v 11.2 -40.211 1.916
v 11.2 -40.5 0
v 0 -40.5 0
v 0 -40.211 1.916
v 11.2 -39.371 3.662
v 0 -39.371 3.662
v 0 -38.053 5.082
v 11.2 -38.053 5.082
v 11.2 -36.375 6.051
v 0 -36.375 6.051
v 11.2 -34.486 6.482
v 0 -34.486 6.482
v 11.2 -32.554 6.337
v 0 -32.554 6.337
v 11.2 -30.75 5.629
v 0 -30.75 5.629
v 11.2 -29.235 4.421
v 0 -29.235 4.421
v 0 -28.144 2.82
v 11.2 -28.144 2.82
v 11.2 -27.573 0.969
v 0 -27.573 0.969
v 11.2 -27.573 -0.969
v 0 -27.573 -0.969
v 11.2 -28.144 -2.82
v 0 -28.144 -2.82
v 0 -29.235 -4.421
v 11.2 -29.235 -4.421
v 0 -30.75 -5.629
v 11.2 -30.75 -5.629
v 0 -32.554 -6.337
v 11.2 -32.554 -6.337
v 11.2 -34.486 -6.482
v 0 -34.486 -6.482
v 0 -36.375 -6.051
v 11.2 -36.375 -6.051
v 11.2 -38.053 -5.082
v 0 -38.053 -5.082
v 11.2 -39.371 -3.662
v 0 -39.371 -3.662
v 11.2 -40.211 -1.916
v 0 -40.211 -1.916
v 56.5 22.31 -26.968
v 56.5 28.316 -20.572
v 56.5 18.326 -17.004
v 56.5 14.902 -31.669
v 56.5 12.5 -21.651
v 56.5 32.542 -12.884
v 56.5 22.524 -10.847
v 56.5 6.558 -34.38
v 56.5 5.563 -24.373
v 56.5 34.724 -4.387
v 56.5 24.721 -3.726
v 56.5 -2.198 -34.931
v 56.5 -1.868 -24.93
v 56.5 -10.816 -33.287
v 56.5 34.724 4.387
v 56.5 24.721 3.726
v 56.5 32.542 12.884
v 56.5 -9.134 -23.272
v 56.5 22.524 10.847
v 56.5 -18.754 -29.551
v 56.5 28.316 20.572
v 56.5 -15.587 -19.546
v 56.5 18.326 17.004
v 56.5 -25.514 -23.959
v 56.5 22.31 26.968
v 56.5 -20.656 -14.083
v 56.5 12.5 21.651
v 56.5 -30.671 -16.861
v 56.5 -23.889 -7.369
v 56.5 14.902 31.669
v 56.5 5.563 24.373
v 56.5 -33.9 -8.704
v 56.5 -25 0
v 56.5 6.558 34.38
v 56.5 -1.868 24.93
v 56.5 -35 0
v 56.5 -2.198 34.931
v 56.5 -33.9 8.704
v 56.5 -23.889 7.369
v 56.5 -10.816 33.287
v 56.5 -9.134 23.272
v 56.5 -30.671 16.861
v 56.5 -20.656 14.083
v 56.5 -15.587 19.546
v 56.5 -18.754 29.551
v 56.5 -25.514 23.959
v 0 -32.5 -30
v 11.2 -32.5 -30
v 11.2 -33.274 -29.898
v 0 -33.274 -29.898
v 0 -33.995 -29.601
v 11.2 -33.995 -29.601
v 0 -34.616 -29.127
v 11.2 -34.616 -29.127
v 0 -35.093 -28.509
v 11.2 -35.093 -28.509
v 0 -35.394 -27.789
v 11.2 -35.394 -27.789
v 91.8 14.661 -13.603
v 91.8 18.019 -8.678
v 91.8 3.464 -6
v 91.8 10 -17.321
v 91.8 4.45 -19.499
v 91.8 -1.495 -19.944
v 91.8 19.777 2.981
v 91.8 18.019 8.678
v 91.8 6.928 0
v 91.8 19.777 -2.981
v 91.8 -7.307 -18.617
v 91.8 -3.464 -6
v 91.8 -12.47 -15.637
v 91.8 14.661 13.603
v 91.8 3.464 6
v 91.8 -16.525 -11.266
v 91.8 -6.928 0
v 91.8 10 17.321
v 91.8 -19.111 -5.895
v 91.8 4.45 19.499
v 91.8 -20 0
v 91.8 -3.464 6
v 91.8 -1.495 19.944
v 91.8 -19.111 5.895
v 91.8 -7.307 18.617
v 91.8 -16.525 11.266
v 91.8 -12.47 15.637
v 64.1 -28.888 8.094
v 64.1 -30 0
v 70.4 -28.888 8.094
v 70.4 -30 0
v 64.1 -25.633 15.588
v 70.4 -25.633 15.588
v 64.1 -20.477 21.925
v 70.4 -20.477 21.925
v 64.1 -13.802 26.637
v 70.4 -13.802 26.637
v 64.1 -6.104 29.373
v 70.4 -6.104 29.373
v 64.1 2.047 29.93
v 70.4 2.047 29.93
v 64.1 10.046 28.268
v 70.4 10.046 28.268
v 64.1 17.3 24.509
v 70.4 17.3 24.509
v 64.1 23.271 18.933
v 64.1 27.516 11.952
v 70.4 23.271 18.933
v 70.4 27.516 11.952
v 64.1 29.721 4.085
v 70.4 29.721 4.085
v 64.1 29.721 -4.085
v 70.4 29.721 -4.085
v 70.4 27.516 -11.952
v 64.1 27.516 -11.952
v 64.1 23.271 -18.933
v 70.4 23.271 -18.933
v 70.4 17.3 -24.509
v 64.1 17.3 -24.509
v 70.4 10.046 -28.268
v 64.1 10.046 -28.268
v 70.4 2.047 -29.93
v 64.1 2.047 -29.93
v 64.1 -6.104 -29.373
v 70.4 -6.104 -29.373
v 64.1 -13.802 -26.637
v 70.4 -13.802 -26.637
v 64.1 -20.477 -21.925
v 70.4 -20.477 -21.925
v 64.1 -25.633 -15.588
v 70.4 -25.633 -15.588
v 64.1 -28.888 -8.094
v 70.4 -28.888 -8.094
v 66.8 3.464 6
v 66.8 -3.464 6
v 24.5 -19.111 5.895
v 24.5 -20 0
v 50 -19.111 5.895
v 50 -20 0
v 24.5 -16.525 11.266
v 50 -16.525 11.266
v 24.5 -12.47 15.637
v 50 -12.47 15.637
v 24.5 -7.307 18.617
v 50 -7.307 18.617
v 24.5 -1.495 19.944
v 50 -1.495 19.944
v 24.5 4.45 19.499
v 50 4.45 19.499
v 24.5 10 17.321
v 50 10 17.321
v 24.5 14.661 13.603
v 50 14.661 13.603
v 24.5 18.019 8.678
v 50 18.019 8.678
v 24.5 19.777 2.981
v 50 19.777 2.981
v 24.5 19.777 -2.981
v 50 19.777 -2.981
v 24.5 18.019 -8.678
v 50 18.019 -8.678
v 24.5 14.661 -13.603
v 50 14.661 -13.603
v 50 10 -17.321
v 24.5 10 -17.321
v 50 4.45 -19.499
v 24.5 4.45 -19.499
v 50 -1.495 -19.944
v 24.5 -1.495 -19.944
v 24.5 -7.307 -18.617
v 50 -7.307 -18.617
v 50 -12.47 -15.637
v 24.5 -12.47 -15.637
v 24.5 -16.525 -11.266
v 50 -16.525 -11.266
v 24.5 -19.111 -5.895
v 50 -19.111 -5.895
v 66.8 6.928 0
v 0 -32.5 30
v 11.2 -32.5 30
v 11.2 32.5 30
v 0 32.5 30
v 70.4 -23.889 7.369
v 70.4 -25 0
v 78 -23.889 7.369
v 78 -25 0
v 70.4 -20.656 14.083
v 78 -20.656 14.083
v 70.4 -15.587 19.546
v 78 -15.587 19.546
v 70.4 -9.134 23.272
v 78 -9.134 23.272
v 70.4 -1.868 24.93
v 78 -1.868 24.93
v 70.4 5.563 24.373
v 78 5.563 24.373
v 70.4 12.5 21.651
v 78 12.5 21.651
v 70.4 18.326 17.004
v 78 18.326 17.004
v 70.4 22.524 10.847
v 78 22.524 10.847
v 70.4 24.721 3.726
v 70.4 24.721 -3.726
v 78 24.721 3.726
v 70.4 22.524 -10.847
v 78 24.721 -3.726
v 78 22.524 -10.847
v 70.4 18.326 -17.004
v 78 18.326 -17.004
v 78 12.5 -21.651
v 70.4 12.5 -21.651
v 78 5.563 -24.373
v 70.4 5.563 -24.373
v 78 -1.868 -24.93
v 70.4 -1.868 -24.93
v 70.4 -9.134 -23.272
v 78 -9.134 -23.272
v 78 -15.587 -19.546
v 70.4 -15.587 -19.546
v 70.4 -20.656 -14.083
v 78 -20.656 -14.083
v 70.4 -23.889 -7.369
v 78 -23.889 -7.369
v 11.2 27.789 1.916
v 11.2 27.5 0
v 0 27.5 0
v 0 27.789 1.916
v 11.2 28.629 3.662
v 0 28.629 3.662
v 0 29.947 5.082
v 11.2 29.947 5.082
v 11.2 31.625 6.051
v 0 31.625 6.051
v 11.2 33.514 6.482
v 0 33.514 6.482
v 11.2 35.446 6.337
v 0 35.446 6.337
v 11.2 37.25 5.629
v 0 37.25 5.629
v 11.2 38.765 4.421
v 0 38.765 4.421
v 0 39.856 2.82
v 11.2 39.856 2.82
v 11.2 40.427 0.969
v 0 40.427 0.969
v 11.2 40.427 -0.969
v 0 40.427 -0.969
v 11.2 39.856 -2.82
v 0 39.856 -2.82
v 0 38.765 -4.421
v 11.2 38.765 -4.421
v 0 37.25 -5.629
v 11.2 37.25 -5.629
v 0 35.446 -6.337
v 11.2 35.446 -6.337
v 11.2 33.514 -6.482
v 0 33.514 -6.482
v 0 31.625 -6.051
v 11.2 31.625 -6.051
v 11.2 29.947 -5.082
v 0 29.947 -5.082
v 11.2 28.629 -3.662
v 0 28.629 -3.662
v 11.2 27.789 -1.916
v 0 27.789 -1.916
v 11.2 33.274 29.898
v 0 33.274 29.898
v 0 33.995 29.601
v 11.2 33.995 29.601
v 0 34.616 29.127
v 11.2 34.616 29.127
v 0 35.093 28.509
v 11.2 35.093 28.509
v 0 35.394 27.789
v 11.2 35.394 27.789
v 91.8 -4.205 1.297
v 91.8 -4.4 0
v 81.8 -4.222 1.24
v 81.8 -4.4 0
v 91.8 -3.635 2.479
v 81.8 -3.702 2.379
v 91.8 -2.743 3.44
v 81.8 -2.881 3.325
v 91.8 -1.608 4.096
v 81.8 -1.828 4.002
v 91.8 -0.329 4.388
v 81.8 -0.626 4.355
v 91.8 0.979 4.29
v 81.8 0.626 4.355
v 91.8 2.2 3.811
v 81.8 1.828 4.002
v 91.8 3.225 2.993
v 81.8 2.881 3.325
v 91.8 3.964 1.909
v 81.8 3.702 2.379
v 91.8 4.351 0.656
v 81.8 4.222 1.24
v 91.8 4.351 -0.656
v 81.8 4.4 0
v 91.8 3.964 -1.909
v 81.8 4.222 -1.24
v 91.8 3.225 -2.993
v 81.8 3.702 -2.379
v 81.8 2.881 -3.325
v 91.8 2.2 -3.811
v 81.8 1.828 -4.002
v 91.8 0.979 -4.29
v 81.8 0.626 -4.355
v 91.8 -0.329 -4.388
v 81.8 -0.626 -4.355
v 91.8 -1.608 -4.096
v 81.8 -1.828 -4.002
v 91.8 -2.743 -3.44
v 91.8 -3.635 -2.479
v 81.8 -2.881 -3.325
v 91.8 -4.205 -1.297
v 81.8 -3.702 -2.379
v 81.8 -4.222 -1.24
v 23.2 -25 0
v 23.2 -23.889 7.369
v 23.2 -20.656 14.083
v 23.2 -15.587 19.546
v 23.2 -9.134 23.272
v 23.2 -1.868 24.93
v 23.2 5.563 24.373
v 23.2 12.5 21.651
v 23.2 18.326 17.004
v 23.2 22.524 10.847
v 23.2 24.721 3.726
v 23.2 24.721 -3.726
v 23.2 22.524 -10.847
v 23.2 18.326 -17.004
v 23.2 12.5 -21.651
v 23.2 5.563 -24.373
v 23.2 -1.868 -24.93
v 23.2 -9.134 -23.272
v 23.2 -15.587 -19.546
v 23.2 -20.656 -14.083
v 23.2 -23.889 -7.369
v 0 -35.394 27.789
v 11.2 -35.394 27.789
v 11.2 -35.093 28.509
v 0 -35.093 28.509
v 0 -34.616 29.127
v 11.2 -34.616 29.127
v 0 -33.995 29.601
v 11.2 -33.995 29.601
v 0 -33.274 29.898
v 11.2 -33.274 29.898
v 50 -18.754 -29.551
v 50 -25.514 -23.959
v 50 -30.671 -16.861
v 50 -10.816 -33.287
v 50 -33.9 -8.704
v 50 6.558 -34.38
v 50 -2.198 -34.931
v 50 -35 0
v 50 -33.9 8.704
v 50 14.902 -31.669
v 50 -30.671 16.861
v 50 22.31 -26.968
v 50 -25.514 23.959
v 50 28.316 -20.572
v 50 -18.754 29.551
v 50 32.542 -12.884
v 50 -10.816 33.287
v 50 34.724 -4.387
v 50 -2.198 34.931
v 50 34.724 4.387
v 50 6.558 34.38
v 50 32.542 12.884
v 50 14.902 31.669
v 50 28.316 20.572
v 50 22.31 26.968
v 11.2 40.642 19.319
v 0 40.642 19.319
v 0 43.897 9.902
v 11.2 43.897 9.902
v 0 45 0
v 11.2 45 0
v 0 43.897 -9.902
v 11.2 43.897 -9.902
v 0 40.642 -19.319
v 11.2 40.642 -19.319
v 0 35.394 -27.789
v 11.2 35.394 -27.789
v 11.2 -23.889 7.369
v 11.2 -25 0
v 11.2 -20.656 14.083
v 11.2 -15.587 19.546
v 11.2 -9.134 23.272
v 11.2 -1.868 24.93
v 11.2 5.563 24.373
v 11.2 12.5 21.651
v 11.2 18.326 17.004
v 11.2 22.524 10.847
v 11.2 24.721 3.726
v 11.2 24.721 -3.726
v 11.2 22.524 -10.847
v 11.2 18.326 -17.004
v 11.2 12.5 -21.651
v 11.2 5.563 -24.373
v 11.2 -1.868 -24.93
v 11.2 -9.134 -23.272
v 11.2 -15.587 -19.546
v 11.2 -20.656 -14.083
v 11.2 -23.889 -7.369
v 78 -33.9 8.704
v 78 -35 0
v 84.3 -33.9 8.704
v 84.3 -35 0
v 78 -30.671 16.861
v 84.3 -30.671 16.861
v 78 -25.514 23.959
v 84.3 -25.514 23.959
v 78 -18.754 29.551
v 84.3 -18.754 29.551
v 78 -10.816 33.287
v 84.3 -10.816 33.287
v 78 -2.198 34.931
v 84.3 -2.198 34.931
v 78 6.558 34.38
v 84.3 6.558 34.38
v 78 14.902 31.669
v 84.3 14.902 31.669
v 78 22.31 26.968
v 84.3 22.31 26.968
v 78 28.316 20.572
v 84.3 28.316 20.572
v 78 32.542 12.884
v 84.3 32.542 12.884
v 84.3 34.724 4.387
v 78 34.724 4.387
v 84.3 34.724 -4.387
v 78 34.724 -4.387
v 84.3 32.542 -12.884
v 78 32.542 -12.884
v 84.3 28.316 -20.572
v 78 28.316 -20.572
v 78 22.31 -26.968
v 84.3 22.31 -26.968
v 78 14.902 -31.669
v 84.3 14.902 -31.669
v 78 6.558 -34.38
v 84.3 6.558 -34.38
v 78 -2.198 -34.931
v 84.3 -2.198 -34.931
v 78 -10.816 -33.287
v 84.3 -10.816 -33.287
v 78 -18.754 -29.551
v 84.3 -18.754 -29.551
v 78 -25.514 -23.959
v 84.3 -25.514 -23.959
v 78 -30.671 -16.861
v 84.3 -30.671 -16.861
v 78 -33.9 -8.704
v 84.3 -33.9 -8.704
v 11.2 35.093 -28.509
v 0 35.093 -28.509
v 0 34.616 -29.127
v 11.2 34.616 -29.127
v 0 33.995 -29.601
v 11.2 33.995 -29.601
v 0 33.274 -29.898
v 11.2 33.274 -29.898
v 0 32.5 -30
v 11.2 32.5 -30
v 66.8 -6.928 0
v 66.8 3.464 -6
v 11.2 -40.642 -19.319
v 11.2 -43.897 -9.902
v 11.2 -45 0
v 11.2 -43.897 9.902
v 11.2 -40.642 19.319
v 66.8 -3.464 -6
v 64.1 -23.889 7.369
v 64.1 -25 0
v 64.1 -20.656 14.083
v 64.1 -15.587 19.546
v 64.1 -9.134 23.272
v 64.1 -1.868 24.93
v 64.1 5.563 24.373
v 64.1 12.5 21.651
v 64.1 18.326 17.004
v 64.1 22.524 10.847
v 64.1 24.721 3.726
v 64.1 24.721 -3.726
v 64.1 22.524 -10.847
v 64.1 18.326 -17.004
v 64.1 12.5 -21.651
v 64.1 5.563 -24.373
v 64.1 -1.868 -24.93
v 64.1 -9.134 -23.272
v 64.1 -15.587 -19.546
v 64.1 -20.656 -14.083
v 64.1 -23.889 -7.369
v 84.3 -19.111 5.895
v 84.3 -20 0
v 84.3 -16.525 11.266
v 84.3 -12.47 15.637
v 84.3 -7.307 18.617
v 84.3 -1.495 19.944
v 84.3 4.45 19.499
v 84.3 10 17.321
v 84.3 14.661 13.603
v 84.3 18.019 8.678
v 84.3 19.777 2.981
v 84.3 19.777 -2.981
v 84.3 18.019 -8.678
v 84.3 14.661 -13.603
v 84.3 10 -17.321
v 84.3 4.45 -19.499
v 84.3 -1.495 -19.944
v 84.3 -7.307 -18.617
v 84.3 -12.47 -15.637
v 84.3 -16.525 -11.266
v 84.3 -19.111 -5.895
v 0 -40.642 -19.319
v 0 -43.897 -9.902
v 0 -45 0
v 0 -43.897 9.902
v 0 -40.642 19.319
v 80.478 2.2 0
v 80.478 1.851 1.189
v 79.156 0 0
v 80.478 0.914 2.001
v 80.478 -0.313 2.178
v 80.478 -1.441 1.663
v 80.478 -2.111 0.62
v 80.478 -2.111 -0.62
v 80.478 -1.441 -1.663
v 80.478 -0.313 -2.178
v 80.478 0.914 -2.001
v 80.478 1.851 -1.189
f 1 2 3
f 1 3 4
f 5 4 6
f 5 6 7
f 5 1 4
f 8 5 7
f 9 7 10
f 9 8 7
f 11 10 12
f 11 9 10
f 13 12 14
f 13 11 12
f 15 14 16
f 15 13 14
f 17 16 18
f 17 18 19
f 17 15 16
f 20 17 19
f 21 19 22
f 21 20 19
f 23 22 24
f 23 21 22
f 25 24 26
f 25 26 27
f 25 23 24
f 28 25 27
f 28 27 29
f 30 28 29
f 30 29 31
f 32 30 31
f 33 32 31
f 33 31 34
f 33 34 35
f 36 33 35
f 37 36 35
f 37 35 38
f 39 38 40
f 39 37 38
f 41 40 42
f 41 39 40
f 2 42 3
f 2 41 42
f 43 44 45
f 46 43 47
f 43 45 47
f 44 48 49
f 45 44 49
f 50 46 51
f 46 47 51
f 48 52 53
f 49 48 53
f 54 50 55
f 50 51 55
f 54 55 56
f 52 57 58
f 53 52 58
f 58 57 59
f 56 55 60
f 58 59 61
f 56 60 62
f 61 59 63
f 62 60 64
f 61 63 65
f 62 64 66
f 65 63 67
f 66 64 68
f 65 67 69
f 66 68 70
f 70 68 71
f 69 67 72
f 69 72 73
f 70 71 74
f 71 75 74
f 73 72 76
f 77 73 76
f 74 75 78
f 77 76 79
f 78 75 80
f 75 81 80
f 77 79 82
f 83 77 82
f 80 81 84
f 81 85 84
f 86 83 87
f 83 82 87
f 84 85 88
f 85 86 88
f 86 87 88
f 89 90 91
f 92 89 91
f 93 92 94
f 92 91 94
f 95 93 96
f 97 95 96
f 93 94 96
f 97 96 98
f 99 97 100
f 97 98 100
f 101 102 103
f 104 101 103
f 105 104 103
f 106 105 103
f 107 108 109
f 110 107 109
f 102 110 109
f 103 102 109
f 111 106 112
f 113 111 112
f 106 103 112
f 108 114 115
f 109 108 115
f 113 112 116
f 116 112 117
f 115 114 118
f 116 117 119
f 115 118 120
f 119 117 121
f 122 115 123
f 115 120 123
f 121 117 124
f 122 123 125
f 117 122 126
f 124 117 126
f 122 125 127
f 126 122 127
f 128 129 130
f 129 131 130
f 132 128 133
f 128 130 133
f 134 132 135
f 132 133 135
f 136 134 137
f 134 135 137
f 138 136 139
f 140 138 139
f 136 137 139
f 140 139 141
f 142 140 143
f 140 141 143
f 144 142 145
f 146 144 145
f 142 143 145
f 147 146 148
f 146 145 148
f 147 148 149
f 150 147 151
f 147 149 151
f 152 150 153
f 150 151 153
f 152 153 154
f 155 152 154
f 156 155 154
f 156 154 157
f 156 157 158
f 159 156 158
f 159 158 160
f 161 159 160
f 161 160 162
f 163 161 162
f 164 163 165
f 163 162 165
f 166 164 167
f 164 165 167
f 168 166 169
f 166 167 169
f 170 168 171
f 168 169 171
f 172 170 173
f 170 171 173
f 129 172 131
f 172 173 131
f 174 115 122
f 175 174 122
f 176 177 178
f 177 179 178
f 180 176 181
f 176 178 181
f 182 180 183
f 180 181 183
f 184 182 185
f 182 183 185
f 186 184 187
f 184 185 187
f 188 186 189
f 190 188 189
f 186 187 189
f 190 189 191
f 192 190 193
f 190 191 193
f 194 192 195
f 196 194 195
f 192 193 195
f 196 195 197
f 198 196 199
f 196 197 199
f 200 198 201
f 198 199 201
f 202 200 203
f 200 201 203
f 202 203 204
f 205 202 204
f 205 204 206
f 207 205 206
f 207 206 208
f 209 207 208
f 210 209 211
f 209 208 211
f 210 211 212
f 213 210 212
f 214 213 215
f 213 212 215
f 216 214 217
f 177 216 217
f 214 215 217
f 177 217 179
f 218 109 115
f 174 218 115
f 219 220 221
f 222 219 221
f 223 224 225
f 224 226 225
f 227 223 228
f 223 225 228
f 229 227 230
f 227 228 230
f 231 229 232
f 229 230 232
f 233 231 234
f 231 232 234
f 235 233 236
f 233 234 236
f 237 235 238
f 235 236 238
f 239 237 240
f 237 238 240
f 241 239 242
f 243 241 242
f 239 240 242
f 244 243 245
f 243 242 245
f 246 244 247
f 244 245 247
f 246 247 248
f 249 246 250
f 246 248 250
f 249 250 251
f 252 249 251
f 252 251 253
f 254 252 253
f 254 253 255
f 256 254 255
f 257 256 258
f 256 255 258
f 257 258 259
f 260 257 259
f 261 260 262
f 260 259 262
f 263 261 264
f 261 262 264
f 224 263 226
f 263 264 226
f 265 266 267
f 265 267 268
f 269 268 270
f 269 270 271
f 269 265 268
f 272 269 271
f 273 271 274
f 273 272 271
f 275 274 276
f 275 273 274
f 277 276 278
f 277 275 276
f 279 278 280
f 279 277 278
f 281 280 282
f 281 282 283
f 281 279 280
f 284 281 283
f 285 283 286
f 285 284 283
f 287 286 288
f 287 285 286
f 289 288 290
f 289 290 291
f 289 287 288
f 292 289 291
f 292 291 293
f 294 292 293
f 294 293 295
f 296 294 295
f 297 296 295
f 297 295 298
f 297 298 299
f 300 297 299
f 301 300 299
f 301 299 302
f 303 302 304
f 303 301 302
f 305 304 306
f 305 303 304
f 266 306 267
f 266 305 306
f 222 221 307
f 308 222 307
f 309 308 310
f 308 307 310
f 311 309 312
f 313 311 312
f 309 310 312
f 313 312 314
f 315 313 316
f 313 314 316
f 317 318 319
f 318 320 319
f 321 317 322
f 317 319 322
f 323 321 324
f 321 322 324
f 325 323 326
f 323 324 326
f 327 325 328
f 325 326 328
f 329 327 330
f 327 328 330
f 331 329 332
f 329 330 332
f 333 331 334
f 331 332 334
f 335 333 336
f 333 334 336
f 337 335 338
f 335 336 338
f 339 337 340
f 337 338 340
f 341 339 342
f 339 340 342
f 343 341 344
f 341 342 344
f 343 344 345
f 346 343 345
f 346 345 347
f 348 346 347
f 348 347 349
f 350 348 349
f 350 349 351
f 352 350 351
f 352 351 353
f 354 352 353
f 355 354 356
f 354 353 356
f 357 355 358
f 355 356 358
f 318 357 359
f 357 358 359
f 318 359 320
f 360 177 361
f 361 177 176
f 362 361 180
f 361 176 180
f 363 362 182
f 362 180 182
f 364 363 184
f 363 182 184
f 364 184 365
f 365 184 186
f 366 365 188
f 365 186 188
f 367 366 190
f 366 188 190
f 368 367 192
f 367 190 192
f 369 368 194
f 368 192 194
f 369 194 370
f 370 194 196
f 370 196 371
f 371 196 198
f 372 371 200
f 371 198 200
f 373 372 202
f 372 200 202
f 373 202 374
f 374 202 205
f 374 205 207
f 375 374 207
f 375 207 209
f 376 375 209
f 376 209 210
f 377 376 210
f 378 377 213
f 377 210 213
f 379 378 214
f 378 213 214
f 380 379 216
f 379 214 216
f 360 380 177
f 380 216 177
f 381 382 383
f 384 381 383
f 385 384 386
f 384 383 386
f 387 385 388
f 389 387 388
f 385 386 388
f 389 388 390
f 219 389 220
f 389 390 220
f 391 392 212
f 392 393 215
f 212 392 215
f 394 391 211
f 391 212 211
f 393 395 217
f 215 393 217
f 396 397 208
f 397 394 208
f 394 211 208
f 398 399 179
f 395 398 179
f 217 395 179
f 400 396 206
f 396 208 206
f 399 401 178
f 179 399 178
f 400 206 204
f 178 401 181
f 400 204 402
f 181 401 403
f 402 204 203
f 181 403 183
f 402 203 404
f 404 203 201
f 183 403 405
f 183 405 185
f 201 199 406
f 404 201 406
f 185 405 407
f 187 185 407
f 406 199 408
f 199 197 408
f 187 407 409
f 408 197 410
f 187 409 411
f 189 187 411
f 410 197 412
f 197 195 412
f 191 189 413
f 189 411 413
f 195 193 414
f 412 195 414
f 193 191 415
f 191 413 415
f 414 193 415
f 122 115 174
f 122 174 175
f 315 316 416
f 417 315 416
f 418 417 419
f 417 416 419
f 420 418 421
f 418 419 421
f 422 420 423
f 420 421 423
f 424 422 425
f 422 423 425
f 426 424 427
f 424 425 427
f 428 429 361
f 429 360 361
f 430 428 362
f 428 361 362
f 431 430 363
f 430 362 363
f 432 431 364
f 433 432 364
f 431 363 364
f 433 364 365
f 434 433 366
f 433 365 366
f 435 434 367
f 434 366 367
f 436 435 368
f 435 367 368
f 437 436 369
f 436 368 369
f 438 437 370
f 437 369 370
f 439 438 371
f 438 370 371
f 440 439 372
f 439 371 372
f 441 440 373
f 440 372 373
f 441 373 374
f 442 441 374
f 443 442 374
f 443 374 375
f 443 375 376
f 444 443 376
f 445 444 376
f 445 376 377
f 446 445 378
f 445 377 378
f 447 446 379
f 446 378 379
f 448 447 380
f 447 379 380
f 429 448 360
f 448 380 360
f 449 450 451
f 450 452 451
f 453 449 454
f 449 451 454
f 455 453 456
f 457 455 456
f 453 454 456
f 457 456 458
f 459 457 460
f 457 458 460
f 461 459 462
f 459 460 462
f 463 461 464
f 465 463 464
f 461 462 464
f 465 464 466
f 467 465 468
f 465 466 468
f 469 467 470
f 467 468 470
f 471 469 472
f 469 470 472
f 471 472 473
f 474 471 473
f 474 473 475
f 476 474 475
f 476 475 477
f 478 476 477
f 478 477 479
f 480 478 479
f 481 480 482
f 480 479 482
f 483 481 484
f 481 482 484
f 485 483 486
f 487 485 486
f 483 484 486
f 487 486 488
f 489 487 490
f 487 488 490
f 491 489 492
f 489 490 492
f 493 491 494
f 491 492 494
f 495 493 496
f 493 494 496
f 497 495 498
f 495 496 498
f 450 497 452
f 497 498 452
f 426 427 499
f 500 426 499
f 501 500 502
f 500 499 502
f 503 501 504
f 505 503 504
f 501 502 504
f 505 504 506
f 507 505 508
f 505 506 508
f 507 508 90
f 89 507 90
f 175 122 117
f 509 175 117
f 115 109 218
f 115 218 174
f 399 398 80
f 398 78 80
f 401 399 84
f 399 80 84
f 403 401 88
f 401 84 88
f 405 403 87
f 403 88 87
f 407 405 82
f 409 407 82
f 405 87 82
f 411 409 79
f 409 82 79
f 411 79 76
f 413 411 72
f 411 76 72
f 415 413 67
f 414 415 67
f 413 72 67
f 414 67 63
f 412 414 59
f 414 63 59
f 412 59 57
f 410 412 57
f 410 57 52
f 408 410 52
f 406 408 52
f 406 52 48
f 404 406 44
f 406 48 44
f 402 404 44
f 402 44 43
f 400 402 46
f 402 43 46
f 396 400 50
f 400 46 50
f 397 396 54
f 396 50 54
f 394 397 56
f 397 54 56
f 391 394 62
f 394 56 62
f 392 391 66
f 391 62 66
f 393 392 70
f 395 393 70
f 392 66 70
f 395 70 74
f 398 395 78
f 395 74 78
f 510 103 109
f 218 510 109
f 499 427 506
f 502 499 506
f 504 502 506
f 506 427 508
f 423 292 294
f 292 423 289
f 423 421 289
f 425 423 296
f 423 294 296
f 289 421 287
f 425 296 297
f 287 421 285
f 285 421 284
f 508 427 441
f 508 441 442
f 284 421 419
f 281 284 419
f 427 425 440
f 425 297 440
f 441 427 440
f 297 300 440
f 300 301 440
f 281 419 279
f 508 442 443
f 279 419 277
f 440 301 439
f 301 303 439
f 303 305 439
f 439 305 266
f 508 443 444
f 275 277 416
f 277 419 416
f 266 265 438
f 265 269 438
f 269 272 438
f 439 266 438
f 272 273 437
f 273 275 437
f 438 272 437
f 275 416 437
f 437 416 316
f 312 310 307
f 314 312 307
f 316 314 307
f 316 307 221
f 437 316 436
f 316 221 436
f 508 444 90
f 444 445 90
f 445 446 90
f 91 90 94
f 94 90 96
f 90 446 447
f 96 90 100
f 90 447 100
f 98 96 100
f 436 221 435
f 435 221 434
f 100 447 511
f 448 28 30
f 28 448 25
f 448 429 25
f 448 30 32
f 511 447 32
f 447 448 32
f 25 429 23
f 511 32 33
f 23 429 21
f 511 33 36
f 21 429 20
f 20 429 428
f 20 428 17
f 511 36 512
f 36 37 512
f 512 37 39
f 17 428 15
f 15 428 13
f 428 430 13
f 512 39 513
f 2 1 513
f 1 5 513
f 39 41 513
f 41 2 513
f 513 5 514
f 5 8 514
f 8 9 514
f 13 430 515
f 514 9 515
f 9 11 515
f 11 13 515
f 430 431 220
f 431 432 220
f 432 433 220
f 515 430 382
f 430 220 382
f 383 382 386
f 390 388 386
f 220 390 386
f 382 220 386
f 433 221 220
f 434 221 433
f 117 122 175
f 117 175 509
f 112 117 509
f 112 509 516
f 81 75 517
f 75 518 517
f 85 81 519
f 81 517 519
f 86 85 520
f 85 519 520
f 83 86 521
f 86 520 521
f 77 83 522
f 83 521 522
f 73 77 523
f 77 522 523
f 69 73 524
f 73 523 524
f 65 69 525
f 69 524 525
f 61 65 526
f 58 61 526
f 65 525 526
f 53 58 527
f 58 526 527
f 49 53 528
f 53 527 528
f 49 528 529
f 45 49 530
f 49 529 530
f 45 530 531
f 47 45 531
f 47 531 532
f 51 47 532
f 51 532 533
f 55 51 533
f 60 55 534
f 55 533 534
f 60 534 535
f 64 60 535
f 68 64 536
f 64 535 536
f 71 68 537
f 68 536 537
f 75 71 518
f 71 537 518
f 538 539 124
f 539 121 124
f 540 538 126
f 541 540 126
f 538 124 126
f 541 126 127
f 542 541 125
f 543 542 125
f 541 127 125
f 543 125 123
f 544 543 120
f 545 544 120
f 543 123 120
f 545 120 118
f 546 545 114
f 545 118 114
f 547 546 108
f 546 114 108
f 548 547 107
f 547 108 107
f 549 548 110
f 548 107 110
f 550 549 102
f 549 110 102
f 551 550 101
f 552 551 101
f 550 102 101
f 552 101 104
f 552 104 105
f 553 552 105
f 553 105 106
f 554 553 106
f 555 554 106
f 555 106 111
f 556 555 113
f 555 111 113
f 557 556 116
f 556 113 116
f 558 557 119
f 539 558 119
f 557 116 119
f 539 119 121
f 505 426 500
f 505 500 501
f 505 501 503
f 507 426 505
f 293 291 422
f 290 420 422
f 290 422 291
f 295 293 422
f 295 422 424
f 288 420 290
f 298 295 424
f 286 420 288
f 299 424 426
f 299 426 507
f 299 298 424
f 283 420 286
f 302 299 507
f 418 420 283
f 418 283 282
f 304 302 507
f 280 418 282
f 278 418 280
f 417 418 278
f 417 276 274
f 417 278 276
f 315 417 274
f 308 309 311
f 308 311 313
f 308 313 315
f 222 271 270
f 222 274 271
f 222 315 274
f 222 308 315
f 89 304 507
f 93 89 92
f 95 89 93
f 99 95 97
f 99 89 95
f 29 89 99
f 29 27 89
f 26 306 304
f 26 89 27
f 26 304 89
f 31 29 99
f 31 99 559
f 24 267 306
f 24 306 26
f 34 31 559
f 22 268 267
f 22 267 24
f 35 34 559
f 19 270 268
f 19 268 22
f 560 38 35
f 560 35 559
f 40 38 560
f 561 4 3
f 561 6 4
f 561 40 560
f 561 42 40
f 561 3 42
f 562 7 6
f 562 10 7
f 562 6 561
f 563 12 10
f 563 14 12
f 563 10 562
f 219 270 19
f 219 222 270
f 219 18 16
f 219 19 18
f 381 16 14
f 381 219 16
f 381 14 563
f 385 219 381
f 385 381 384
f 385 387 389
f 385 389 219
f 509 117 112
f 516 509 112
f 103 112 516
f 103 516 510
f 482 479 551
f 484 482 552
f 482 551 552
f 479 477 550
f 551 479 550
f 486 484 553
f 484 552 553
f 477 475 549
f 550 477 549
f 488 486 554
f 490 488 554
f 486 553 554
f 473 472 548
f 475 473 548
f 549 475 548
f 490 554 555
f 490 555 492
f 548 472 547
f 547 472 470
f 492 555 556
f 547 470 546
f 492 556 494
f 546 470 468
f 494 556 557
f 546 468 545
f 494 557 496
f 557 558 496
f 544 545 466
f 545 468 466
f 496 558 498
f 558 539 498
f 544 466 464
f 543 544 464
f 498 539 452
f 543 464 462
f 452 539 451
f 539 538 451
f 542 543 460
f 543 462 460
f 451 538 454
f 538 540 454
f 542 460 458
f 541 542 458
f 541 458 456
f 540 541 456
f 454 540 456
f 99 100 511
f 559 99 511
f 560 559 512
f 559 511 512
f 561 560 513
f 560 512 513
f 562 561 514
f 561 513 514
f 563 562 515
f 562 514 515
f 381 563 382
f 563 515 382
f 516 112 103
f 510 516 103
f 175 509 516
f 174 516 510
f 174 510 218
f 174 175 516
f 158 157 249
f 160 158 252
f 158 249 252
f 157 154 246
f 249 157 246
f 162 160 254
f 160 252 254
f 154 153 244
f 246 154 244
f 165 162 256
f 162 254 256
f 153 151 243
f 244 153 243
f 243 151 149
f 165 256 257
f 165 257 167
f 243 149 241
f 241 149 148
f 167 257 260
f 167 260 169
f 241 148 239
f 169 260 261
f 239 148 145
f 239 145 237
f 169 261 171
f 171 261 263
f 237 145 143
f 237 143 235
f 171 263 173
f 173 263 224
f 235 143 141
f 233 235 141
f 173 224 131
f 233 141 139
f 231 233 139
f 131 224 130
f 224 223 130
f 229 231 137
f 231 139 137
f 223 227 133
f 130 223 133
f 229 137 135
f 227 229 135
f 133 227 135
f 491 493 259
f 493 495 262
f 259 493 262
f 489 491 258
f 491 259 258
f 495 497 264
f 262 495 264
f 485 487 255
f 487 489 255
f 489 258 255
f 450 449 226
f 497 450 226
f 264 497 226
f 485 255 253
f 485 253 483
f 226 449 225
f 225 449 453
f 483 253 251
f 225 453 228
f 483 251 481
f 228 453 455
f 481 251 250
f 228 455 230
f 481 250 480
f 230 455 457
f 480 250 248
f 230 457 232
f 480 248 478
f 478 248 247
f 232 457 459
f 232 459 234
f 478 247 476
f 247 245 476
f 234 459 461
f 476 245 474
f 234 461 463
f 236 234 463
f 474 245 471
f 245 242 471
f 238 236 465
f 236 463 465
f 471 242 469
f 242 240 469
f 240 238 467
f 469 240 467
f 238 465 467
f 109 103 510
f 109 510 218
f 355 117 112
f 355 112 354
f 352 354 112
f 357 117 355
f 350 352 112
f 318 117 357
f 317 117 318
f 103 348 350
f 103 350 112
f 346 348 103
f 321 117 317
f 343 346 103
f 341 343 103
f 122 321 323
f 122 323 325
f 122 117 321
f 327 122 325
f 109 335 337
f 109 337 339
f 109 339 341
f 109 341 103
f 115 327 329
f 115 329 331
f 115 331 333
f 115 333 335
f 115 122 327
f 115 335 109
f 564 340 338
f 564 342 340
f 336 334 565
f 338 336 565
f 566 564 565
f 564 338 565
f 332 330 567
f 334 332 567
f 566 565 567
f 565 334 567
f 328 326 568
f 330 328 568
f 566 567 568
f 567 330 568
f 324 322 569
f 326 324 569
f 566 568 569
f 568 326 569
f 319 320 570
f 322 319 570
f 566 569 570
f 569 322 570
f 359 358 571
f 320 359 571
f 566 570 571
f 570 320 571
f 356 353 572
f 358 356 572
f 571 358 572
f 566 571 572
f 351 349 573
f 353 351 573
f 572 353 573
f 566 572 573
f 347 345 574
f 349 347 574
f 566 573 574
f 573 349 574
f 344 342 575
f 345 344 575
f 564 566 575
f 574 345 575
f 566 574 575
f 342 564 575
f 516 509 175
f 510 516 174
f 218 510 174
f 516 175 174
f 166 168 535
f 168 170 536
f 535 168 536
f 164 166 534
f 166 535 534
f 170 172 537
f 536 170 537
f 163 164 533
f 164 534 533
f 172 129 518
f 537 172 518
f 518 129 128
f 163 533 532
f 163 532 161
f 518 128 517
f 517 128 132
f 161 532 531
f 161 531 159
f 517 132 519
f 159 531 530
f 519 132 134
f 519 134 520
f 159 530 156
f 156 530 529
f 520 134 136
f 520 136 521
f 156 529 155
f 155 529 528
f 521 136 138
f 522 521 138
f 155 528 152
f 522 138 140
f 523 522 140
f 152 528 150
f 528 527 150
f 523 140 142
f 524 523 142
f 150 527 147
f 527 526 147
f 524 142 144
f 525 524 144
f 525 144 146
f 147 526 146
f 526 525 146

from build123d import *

# Parameters (mm, degrees)
F2_R     = 6.5
F2_R_2   = 25
F3_DEPTH = 11.2
F5_DEPTH = 25
F7_D     = 8.8
F7_DEPTH = 10
F7_TIP   = 2.6437867237


with BuildPart() as f1:
    # F0 (on Top) → F1 (revolve)
    with BuildSketch(Plane.XY):
        Polygon((11.2, 0), (11.2, -25), (23.2, -25), (24.5, -20), (50, -20), (50, -35), (56.5, -35), (56.5, -25), (64.1, -25), (64.1, -30), (70.4, -30), (70.4, -25), (78, -25), (78, -35), (84.3, -35), (84.3, -20), (91.8, -20), (91.8, 0), align=None)
    revolve(axis=Axis((46.0906531856, 0, 0), (-1, 0, 0)))

    # F2 (on face) → F3 (join)
    with BuildSketch(Plane(origin=(11.2, 0, 0), x_dir=(0, -1, 0), z_dir=(-1, 0, 0))):
        with BuildLine():
            Line((32.5, 30), (0, 30))
            Line((0, 30), (-32.5, 30))
            ThreePointArc((-32.5, 30), (-34.3210259826, 29.3840856467), (-35.3943212715, 27.7892429139))
            ThreePointArc((-35.3943212715, 27.7892429139), (-45, 0), (-35.3943212715, -27.7892429139))
            ThreePointArc((-35.3943212715, -27.7892429139), (-34.3210259826, -29.3840856467), (-32.5, -30))
            Line((-32.5, -30), (0, -30))
            Line((0, -30), (32.5, -30))
            ThreePointArc((32.5, -30), (34.3210259826, -29.3840856467), (35.3943212715, -27.7892429139))
            ThreePointArc((35.3943212715, -27.7892429139), (45, 0), (35.3943212715, 27.7892429139))
            ThreePointArc((35.3943212715, 27.7892429139), (34.3210259826, 29.3840856467), (32.5, 30))
        make_face()
        with Locations((-34, 0)):
            Circle(F2_R, mode=Mode.SUBTRACT)
        Circle(F2_R_2, mode=Mode.SUBTRACT)
        with Locations((34, 0)):
            Circle(F2_R, mode=Mode.SUBTRACT)
        Circle(F2_R_2)
    extrude(amount=F3_DEPTH)


with BuildPart() as f5:
    # F4 (on face) → F5 (new body)
    with BuildSketch(Plane.YZ.offset(91.8)):
        Polygon((-3.4641016151, -6), (3.4641016151, -6), (6.9282032303, 0), (3.4641016151, 6), (-3.4641016151, 6), (-6.9282032303, 0), align=None)
    extrude(amount=-F5_DEPTH)


with BuildPart() as f1_1:
    add(f1.part)

    # F6: cut F5
    add(f5.part, mode=Mode.SUBTRACT)


with BuildPart() as f5_1:
    add(f5.part)

    # F7
    with Locations(Plane.YZ.offset(91.8)):
        with Locations((0, 0)):
            Hole(F7_D / 2, depth=F7_DEPTH)
            with Locations((0, 0, -(F7_DEPTH + F7_TIP / 2))):  # 118° drill point
                Cone(0, F7_D / 2, F7_TIP, mode=Mode.SUBTRACT)


solid = Compound([f1_1.part, f5_1.part])
